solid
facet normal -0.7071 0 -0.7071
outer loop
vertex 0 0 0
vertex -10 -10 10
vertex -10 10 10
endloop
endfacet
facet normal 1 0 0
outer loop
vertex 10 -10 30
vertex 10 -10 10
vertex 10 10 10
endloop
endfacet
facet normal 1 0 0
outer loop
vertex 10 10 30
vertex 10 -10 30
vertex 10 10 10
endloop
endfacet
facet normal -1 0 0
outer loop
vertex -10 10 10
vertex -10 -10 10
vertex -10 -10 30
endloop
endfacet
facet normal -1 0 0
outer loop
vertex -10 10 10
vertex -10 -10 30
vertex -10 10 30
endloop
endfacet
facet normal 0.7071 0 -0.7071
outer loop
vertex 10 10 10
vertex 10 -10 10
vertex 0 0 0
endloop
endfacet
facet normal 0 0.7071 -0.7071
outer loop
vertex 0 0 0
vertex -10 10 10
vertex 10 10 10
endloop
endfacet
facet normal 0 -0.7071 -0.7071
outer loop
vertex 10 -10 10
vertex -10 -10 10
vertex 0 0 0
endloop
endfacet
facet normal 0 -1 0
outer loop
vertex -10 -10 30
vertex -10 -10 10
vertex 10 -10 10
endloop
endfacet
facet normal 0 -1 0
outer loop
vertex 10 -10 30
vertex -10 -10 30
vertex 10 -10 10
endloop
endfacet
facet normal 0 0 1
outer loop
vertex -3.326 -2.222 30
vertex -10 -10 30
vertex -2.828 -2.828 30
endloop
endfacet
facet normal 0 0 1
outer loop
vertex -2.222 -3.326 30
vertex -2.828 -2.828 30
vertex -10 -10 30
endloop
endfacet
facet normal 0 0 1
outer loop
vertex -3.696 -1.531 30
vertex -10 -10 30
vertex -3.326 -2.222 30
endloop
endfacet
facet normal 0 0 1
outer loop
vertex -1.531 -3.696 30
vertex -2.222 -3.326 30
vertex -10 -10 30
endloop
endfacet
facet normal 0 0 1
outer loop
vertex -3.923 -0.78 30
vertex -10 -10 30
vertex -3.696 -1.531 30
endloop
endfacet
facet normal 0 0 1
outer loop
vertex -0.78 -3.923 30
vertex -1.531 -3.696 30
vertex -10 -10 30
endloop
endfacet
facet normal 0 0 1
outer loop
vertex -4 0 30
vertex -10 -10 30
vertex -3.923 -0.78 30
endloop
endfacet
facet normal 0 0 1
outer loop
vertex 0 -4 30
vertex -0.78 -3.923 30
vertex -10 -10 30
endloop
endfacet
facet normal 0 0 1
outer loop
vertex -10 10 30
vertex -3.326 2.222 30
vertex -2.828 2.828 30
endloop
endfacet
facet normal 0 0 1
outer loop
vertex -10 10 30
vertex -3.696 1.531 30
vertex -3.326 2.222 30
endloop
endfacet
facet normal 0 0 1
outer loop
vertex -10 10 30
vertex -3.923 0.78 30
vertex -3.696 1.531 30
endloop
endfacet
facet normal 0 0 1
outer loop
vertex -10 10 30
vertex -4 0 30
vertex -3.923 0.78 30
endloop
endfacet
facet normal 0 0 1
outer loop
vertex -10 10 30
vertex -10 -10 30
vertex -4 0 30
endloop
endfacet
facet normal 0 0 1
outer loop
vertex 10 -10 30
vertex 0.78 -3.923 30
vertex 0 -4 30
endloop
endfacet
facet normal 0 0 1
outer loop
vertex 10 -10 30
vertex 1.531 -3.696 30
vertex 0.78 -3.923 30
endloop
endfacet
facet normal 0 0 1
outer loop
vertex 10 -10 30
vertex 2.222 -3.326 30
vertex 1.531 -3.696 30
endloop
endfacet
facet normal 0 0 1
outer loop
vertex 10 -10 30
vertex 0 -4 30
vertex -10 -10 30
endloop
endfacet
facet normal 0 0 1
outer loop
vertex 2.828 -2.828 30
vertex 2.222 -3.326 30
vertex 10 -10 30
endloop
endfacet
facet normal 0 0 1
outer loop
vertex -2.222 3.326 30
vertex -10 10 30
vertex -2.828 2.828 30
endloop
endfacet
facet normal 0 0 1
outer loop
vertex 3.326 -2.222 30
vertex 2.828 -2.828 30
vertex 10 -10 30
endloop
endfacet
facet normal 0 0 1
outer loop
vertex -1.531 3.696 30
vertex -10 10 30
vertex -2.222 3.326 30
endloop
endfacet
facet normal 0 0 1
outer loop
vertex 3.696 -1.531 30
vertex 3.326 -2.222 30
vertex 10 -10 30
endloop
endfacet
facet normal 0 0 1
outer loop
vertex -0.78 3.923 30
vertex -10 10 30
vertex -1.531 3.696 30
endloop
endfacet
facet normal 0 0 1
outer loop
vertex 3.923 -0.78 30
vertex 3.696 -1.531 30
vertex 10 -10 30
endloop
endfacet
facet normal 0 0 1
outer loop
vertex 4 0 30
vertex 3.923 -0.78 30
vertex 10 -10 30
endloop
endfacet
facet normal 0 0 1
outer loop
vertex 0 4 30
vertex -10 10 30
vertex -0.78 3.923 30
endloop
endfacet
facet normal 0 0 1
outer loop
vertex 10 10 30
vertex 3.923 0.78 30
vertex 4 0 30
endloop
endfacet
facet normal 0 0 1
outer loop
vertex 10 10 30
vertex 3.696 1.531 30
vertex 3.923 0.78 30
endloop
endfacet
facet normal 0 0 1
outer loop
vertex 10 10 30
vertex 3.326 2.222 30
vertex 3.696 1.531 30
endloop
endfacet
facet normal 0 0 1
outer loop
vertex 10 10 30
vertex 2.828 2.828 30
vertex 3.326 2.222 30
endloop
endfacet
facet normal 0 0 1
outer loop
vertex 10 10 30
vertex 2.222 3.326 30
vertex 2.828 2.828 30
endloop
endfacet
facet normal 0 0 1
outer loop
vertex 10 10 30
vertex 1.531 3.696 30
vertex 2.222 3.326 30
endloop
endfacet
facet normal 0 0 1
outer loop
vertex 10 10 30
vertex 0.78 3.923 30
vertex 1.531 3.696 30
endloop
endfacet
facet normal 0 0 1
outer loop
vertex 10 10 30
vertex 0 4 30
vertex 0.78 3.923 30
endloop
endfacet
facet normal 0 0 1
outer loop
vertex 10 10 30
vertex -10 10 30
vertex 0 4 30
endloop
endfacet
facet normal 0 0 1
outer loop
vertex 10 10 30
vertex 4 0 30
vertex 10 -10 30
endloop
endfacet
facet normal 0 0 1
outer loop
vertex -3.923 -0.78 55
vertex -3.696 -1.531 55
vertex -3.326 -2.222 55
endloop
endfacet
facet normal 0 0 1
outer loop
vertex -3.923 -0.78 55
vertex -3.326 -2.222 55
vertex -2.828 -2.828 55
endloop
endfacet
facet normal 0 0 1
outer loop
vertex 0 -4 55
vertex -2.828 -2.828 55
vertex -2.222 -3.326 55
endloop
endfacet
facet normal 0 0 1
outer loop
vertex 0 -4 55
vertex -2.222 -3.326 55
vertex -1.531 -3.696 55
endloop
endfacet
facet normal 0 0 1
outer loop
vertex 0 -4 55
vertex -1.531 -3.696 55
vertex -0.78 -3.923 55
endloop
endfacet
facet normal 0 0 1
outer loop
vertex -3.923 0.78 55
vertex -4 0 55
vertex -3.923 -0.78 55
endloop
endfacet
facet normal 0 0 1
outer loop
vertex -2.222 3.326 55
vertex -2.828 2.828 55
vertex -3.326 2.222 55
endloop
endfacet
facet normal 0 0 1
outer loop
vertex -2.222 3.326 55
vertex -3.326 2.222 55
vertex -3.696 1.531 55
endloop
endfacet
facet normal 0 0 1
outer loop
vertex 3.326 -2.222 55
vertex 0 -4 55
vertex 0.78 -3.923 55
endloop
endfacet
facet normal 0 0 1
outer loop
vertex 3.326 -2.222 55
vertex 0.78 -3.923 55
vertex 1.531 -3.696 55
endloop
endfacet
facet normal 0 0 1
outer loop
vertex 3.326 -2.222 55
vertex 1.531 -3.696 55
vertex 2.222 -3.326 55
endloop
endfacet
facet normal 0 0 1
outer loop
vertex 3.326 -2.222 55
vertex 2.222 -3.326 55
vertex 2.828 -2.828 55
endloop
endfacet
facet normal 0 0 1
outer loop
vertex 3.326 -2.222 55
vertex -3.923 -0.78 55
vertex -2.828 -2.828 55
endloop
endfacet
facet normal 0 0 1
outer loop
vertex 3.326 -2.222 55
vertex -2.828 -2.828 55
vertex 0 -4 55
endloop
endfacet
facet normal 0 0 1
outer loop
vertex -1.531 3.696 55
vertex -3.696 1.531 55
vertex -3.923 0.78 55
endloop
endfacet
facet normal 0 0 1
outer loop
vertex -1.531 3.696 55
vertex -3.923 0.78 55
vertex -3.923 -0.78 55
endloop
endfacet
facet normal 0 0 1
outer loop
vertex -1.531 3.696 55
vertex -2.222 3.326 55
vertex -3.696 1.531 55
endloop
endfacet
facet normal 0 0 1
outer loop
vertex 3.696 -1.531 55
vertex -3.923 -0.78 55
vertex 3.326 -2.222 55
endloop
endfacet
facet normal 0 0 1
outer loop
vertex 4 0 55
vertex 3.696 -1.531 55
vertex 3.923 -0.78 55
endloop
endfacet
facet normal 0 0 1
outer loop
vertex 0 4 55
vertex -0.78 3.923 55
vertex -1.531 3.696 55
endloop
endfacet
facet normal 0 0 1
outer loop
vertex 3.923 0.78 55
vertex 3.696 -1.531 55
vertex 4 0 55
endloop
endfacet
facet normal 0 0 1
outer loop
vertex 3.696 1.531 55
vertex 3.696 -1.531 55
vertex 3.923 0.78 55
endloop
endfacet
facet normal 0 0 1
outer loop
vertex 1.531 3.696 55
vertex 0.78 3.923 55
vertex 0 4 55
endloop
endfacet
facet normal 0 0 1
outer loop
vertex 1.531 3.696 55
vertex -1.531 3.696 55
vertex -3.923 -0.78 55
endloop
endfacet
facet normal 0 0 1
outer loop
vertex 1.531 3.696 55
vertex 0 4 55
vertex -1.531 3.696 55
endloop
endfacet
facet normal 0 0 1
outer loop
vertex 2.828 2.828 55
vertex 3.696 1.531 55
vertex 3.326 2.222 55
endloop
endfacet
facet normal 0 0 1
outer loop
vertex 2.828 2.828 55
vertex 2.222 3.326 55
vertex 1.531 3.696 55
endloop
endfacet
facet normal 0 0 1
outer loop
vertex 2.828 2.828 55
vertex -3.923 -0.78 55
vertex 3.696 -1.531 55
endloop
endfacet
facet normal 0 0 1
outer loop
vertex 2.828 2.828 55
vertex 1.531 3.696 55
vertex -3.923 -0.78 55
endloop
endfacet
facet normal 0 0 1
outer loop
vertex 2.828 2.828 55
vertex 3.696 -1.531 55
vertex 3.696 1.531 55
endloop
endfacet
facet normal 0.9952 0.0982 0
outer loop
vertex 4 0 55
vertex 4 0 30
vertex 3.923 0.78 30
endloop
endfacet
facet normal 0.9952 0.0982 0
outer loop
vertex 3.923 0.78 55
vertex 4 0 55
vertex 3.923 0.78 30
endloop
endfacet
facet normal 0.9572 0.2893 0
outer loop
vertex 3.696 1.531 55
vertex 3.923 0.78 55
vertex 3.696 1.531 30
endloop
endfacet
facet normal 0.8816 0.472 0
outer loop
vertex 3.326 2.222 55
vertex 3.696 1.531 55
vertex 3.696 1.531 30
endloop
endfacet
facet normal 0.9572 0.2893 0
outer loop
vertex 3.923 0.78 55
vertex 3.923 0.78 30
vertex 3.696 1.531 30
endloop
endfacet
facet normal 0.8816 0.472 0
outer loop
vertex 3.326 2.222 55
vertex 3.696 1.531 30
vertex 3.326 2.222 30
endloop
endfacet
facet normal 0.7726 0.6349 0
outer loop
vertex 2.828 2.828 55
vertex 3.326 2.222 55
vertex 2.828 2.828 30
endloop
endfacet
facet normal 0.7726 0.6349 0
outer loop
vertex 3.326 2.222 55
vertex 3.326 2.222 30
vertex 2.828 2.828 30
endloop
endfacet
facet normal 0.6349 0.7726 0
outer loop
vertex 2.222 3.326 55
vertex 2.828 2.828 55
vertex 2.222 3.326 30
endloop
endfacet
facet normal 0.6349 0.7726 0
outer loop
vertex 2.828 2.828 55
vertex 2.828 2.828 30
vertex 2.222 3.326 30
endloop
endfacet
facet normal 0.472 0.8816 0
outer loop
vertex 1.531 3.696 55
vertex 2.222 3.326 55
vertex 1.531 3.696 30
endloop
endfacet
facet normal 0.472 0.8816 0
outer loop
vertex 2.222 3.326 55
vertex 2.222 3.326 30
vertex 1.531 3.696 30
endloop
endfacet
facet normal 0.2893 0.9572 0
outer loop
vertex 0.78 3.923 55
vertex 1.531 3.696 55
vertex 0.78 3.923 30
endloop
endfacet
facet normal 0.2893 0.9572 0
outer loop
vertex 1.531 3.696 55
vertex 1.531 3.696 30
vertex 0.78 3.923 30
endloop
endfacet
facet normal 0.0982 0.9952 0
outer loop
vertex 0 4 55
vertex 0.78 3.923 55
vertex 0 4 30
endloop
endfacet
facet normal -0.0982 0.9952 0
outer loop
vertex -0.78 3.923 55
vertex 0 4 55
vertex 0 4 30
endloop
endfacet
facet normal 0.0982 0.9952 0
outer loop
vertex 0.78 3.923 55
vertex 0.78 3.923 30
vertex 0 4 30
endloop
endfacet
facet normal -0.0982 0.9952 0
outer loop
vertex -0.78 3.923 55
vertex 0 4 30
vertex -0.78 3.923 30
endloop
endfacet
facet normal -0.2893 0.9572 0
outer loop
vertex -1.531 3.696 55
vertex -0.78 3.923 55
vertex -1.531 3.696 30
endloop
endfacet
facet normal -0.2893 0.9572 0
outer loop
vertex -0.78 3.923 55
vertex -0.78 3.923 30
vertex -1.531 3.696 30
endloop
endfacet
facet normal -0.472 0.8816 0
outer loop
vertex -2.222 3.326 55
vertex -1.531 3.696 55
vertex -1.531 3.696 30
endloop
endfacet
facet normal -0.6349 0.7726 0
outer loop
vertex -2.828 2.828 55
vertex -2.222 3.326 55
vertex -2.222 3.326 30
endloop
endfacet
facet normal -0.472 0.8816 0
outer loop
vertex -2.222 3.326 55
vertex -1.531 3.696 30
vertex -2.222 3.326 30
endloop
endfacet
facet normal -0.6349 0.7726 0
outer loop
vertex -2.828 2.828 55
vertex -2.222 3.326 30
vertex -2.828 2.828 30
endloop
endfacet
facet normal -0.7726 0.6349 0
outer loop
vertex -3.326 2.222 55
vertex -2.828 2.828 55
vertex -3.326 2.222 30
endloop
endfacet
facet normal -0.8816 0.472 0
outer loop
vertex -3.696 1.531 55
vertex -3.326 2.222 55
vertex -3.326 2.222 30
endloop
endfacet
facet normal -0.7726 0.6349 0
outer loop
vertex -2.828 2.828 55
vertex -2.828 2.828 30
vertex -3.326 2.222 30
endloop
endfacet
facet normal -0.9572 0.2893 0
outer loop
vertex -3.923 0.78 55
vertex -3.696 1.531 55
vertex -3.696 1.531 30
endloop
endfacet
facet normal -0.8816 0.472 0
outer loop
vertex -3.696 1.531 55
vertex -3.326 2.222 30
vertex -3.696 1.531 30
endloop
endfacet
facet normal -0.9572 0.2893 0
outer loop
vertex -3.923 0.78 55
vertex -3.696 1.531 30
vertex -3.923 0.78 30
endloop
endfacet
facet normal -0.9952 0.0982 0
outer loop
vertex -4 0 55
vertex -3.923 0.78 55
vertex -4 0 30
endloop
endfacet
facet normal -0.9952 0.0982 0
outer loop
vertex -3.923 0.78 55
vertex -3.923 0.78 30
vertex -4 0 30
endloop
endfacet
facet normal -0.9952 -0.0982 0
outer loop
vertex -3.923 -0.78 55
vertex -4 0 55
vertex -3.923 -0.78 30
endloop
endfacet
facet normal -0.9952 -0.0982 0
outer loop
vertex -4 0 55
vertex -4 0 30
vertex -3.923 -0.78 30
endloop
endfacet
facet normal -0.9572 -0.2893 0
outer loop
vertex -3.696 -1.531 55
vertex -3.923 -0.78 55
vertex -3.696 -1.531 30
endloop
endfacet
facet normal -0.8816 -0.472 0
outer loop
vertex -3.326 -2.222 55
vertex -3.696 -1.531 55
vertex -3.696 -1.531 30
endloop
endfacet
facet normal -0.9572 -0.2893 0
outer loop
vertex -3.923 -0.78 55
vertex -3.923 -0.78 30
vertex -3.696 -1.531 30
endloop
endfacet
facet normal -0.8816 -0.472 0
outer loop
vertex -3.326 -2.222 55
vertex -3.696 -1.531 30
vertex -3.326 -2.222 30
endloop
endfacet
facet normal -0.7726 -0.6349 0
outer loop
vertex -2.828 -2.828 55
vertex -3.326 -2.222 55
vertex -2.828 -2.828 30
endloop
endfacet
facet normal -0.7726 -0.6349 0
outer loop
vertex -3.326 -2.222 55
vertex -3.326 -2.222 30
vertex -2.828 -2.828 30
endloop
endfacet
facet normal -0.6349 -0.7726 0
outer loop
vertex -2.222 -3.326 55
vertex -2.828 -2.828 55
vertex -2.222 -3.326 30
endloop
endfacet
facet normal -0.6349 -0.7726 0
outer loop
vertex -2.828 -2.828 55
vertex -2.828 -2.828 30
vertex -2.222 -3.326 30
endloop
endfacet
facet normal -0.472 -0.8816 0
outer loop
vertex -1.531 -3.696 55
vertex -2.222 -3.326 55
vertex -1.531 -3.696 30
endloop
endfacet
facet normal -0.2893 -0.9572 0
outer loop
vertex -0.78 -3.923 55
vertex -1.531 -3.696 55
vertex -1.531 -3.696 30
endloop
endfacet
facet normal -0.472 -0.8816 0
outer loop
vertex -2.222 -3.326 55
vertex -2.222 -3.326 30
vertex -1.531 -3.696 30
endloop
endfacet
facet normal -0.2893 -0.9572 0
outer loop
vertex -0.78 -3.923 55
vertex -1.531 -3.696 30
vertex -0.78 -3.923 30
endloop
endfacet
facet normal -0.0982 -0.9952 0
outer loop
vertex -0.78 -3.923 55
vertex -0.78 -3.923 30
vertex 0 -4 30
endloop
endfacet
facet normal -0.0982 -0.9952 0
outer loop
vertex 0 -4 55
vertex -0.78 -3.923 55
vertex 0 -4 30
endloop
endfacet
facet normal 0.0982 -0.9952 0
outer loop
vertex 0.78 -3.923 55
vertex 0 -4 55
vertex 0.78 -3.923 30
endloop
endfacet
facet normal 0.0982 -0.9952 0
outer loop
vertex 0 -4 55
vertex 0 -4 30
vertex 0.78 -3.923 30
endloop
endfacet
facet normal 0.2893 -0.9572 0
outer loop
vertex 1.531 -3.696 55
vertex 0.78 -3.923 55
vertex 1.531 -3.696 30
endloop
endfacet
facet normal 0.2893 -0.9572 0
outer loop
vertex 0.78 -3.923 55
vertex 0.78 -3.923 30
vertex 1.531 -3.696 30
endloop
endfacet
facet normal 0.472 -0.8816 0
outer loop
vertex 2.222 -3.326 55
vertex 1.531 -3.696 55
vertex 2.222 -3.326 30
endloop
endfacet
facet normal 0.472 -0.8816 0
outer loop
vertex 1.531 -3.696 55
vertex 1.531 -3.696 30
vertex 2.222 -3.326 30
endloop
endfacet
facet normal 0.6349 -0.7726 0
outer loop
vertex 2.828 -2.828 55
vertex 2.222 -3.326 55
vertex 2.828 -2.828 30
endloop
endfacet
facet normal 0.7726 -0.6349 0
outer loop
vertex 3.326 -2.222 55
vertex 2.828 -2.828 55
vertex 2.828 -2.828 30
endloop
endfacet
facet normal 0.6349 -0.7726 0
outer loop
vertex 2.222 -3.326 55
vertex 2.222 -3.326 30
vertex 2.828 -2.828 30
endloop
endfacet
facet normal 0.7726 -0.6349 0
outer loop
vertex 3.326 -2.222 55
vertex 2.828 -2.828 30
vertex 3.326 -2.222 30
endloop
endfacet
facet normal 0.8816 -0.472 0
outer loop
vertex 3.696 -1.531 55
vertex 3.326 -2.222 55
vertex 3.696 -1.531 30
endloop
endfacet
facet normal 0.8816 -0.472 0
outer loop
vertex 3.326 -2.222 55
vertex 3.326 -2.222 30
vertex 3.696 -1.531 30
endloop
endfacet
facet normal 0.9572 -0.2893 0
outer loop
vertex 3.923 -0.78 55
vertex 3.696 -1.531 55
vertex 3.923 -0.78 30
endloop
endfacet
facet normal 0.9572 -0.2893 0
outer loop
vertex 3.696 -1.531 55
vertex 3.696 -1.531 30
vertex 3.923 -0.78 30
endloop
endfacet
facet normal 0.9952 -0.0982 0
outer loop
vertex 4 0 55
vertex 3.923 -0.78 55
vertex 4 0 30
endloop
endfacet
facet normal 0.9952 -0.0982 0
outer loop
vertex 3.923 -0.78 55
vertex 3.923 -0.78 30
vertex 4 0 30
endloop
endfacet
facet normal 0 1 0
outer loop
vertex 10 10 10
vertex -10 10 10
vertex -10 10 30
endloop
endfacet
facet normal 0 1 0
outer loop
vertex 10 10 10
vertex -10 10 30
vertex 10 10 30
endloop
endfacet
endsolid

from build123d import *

# Parameters (mm, degrees)
F0_W     = 20
F0_H     = 20
F1_DEPTH = 30
F2_R     = 4
F3_DEPTH = 25
F4_SIZE  = 9.99999


# Not quite as in the source:
# - a fillet or chamfer is up to 0.001 mm smaller than in the source, because OpenCascade refuses the exact size


with BuildPart() as f1:
    # F0 (on Top) → F1 (new body)
    with BuildSketch(Plane.XY):
        Rectangle(F0_W, F0_H)
    extrude(amount=F1_DEPTH)

    # F2 (on face) → F3 (join)
    with BuildSketch(Plane.XY.offset(30)):
        Circle(F2_R)
    extrude(amount=F3_DEPTH)

    # F4 (size 10 in the source; OpenCascade refuses exactly that, so slightly less here)
    f4_edges = [f1.edges().sort_by_distance(p)[0] for p in [
        (10, 0, 0),
        (0, 10, 0),
        (-10, 0, 0),
        (0, -10, 0),
    ]]
    chamfer(f4_edges, length=F4_SIZE)


solid = f1.part
